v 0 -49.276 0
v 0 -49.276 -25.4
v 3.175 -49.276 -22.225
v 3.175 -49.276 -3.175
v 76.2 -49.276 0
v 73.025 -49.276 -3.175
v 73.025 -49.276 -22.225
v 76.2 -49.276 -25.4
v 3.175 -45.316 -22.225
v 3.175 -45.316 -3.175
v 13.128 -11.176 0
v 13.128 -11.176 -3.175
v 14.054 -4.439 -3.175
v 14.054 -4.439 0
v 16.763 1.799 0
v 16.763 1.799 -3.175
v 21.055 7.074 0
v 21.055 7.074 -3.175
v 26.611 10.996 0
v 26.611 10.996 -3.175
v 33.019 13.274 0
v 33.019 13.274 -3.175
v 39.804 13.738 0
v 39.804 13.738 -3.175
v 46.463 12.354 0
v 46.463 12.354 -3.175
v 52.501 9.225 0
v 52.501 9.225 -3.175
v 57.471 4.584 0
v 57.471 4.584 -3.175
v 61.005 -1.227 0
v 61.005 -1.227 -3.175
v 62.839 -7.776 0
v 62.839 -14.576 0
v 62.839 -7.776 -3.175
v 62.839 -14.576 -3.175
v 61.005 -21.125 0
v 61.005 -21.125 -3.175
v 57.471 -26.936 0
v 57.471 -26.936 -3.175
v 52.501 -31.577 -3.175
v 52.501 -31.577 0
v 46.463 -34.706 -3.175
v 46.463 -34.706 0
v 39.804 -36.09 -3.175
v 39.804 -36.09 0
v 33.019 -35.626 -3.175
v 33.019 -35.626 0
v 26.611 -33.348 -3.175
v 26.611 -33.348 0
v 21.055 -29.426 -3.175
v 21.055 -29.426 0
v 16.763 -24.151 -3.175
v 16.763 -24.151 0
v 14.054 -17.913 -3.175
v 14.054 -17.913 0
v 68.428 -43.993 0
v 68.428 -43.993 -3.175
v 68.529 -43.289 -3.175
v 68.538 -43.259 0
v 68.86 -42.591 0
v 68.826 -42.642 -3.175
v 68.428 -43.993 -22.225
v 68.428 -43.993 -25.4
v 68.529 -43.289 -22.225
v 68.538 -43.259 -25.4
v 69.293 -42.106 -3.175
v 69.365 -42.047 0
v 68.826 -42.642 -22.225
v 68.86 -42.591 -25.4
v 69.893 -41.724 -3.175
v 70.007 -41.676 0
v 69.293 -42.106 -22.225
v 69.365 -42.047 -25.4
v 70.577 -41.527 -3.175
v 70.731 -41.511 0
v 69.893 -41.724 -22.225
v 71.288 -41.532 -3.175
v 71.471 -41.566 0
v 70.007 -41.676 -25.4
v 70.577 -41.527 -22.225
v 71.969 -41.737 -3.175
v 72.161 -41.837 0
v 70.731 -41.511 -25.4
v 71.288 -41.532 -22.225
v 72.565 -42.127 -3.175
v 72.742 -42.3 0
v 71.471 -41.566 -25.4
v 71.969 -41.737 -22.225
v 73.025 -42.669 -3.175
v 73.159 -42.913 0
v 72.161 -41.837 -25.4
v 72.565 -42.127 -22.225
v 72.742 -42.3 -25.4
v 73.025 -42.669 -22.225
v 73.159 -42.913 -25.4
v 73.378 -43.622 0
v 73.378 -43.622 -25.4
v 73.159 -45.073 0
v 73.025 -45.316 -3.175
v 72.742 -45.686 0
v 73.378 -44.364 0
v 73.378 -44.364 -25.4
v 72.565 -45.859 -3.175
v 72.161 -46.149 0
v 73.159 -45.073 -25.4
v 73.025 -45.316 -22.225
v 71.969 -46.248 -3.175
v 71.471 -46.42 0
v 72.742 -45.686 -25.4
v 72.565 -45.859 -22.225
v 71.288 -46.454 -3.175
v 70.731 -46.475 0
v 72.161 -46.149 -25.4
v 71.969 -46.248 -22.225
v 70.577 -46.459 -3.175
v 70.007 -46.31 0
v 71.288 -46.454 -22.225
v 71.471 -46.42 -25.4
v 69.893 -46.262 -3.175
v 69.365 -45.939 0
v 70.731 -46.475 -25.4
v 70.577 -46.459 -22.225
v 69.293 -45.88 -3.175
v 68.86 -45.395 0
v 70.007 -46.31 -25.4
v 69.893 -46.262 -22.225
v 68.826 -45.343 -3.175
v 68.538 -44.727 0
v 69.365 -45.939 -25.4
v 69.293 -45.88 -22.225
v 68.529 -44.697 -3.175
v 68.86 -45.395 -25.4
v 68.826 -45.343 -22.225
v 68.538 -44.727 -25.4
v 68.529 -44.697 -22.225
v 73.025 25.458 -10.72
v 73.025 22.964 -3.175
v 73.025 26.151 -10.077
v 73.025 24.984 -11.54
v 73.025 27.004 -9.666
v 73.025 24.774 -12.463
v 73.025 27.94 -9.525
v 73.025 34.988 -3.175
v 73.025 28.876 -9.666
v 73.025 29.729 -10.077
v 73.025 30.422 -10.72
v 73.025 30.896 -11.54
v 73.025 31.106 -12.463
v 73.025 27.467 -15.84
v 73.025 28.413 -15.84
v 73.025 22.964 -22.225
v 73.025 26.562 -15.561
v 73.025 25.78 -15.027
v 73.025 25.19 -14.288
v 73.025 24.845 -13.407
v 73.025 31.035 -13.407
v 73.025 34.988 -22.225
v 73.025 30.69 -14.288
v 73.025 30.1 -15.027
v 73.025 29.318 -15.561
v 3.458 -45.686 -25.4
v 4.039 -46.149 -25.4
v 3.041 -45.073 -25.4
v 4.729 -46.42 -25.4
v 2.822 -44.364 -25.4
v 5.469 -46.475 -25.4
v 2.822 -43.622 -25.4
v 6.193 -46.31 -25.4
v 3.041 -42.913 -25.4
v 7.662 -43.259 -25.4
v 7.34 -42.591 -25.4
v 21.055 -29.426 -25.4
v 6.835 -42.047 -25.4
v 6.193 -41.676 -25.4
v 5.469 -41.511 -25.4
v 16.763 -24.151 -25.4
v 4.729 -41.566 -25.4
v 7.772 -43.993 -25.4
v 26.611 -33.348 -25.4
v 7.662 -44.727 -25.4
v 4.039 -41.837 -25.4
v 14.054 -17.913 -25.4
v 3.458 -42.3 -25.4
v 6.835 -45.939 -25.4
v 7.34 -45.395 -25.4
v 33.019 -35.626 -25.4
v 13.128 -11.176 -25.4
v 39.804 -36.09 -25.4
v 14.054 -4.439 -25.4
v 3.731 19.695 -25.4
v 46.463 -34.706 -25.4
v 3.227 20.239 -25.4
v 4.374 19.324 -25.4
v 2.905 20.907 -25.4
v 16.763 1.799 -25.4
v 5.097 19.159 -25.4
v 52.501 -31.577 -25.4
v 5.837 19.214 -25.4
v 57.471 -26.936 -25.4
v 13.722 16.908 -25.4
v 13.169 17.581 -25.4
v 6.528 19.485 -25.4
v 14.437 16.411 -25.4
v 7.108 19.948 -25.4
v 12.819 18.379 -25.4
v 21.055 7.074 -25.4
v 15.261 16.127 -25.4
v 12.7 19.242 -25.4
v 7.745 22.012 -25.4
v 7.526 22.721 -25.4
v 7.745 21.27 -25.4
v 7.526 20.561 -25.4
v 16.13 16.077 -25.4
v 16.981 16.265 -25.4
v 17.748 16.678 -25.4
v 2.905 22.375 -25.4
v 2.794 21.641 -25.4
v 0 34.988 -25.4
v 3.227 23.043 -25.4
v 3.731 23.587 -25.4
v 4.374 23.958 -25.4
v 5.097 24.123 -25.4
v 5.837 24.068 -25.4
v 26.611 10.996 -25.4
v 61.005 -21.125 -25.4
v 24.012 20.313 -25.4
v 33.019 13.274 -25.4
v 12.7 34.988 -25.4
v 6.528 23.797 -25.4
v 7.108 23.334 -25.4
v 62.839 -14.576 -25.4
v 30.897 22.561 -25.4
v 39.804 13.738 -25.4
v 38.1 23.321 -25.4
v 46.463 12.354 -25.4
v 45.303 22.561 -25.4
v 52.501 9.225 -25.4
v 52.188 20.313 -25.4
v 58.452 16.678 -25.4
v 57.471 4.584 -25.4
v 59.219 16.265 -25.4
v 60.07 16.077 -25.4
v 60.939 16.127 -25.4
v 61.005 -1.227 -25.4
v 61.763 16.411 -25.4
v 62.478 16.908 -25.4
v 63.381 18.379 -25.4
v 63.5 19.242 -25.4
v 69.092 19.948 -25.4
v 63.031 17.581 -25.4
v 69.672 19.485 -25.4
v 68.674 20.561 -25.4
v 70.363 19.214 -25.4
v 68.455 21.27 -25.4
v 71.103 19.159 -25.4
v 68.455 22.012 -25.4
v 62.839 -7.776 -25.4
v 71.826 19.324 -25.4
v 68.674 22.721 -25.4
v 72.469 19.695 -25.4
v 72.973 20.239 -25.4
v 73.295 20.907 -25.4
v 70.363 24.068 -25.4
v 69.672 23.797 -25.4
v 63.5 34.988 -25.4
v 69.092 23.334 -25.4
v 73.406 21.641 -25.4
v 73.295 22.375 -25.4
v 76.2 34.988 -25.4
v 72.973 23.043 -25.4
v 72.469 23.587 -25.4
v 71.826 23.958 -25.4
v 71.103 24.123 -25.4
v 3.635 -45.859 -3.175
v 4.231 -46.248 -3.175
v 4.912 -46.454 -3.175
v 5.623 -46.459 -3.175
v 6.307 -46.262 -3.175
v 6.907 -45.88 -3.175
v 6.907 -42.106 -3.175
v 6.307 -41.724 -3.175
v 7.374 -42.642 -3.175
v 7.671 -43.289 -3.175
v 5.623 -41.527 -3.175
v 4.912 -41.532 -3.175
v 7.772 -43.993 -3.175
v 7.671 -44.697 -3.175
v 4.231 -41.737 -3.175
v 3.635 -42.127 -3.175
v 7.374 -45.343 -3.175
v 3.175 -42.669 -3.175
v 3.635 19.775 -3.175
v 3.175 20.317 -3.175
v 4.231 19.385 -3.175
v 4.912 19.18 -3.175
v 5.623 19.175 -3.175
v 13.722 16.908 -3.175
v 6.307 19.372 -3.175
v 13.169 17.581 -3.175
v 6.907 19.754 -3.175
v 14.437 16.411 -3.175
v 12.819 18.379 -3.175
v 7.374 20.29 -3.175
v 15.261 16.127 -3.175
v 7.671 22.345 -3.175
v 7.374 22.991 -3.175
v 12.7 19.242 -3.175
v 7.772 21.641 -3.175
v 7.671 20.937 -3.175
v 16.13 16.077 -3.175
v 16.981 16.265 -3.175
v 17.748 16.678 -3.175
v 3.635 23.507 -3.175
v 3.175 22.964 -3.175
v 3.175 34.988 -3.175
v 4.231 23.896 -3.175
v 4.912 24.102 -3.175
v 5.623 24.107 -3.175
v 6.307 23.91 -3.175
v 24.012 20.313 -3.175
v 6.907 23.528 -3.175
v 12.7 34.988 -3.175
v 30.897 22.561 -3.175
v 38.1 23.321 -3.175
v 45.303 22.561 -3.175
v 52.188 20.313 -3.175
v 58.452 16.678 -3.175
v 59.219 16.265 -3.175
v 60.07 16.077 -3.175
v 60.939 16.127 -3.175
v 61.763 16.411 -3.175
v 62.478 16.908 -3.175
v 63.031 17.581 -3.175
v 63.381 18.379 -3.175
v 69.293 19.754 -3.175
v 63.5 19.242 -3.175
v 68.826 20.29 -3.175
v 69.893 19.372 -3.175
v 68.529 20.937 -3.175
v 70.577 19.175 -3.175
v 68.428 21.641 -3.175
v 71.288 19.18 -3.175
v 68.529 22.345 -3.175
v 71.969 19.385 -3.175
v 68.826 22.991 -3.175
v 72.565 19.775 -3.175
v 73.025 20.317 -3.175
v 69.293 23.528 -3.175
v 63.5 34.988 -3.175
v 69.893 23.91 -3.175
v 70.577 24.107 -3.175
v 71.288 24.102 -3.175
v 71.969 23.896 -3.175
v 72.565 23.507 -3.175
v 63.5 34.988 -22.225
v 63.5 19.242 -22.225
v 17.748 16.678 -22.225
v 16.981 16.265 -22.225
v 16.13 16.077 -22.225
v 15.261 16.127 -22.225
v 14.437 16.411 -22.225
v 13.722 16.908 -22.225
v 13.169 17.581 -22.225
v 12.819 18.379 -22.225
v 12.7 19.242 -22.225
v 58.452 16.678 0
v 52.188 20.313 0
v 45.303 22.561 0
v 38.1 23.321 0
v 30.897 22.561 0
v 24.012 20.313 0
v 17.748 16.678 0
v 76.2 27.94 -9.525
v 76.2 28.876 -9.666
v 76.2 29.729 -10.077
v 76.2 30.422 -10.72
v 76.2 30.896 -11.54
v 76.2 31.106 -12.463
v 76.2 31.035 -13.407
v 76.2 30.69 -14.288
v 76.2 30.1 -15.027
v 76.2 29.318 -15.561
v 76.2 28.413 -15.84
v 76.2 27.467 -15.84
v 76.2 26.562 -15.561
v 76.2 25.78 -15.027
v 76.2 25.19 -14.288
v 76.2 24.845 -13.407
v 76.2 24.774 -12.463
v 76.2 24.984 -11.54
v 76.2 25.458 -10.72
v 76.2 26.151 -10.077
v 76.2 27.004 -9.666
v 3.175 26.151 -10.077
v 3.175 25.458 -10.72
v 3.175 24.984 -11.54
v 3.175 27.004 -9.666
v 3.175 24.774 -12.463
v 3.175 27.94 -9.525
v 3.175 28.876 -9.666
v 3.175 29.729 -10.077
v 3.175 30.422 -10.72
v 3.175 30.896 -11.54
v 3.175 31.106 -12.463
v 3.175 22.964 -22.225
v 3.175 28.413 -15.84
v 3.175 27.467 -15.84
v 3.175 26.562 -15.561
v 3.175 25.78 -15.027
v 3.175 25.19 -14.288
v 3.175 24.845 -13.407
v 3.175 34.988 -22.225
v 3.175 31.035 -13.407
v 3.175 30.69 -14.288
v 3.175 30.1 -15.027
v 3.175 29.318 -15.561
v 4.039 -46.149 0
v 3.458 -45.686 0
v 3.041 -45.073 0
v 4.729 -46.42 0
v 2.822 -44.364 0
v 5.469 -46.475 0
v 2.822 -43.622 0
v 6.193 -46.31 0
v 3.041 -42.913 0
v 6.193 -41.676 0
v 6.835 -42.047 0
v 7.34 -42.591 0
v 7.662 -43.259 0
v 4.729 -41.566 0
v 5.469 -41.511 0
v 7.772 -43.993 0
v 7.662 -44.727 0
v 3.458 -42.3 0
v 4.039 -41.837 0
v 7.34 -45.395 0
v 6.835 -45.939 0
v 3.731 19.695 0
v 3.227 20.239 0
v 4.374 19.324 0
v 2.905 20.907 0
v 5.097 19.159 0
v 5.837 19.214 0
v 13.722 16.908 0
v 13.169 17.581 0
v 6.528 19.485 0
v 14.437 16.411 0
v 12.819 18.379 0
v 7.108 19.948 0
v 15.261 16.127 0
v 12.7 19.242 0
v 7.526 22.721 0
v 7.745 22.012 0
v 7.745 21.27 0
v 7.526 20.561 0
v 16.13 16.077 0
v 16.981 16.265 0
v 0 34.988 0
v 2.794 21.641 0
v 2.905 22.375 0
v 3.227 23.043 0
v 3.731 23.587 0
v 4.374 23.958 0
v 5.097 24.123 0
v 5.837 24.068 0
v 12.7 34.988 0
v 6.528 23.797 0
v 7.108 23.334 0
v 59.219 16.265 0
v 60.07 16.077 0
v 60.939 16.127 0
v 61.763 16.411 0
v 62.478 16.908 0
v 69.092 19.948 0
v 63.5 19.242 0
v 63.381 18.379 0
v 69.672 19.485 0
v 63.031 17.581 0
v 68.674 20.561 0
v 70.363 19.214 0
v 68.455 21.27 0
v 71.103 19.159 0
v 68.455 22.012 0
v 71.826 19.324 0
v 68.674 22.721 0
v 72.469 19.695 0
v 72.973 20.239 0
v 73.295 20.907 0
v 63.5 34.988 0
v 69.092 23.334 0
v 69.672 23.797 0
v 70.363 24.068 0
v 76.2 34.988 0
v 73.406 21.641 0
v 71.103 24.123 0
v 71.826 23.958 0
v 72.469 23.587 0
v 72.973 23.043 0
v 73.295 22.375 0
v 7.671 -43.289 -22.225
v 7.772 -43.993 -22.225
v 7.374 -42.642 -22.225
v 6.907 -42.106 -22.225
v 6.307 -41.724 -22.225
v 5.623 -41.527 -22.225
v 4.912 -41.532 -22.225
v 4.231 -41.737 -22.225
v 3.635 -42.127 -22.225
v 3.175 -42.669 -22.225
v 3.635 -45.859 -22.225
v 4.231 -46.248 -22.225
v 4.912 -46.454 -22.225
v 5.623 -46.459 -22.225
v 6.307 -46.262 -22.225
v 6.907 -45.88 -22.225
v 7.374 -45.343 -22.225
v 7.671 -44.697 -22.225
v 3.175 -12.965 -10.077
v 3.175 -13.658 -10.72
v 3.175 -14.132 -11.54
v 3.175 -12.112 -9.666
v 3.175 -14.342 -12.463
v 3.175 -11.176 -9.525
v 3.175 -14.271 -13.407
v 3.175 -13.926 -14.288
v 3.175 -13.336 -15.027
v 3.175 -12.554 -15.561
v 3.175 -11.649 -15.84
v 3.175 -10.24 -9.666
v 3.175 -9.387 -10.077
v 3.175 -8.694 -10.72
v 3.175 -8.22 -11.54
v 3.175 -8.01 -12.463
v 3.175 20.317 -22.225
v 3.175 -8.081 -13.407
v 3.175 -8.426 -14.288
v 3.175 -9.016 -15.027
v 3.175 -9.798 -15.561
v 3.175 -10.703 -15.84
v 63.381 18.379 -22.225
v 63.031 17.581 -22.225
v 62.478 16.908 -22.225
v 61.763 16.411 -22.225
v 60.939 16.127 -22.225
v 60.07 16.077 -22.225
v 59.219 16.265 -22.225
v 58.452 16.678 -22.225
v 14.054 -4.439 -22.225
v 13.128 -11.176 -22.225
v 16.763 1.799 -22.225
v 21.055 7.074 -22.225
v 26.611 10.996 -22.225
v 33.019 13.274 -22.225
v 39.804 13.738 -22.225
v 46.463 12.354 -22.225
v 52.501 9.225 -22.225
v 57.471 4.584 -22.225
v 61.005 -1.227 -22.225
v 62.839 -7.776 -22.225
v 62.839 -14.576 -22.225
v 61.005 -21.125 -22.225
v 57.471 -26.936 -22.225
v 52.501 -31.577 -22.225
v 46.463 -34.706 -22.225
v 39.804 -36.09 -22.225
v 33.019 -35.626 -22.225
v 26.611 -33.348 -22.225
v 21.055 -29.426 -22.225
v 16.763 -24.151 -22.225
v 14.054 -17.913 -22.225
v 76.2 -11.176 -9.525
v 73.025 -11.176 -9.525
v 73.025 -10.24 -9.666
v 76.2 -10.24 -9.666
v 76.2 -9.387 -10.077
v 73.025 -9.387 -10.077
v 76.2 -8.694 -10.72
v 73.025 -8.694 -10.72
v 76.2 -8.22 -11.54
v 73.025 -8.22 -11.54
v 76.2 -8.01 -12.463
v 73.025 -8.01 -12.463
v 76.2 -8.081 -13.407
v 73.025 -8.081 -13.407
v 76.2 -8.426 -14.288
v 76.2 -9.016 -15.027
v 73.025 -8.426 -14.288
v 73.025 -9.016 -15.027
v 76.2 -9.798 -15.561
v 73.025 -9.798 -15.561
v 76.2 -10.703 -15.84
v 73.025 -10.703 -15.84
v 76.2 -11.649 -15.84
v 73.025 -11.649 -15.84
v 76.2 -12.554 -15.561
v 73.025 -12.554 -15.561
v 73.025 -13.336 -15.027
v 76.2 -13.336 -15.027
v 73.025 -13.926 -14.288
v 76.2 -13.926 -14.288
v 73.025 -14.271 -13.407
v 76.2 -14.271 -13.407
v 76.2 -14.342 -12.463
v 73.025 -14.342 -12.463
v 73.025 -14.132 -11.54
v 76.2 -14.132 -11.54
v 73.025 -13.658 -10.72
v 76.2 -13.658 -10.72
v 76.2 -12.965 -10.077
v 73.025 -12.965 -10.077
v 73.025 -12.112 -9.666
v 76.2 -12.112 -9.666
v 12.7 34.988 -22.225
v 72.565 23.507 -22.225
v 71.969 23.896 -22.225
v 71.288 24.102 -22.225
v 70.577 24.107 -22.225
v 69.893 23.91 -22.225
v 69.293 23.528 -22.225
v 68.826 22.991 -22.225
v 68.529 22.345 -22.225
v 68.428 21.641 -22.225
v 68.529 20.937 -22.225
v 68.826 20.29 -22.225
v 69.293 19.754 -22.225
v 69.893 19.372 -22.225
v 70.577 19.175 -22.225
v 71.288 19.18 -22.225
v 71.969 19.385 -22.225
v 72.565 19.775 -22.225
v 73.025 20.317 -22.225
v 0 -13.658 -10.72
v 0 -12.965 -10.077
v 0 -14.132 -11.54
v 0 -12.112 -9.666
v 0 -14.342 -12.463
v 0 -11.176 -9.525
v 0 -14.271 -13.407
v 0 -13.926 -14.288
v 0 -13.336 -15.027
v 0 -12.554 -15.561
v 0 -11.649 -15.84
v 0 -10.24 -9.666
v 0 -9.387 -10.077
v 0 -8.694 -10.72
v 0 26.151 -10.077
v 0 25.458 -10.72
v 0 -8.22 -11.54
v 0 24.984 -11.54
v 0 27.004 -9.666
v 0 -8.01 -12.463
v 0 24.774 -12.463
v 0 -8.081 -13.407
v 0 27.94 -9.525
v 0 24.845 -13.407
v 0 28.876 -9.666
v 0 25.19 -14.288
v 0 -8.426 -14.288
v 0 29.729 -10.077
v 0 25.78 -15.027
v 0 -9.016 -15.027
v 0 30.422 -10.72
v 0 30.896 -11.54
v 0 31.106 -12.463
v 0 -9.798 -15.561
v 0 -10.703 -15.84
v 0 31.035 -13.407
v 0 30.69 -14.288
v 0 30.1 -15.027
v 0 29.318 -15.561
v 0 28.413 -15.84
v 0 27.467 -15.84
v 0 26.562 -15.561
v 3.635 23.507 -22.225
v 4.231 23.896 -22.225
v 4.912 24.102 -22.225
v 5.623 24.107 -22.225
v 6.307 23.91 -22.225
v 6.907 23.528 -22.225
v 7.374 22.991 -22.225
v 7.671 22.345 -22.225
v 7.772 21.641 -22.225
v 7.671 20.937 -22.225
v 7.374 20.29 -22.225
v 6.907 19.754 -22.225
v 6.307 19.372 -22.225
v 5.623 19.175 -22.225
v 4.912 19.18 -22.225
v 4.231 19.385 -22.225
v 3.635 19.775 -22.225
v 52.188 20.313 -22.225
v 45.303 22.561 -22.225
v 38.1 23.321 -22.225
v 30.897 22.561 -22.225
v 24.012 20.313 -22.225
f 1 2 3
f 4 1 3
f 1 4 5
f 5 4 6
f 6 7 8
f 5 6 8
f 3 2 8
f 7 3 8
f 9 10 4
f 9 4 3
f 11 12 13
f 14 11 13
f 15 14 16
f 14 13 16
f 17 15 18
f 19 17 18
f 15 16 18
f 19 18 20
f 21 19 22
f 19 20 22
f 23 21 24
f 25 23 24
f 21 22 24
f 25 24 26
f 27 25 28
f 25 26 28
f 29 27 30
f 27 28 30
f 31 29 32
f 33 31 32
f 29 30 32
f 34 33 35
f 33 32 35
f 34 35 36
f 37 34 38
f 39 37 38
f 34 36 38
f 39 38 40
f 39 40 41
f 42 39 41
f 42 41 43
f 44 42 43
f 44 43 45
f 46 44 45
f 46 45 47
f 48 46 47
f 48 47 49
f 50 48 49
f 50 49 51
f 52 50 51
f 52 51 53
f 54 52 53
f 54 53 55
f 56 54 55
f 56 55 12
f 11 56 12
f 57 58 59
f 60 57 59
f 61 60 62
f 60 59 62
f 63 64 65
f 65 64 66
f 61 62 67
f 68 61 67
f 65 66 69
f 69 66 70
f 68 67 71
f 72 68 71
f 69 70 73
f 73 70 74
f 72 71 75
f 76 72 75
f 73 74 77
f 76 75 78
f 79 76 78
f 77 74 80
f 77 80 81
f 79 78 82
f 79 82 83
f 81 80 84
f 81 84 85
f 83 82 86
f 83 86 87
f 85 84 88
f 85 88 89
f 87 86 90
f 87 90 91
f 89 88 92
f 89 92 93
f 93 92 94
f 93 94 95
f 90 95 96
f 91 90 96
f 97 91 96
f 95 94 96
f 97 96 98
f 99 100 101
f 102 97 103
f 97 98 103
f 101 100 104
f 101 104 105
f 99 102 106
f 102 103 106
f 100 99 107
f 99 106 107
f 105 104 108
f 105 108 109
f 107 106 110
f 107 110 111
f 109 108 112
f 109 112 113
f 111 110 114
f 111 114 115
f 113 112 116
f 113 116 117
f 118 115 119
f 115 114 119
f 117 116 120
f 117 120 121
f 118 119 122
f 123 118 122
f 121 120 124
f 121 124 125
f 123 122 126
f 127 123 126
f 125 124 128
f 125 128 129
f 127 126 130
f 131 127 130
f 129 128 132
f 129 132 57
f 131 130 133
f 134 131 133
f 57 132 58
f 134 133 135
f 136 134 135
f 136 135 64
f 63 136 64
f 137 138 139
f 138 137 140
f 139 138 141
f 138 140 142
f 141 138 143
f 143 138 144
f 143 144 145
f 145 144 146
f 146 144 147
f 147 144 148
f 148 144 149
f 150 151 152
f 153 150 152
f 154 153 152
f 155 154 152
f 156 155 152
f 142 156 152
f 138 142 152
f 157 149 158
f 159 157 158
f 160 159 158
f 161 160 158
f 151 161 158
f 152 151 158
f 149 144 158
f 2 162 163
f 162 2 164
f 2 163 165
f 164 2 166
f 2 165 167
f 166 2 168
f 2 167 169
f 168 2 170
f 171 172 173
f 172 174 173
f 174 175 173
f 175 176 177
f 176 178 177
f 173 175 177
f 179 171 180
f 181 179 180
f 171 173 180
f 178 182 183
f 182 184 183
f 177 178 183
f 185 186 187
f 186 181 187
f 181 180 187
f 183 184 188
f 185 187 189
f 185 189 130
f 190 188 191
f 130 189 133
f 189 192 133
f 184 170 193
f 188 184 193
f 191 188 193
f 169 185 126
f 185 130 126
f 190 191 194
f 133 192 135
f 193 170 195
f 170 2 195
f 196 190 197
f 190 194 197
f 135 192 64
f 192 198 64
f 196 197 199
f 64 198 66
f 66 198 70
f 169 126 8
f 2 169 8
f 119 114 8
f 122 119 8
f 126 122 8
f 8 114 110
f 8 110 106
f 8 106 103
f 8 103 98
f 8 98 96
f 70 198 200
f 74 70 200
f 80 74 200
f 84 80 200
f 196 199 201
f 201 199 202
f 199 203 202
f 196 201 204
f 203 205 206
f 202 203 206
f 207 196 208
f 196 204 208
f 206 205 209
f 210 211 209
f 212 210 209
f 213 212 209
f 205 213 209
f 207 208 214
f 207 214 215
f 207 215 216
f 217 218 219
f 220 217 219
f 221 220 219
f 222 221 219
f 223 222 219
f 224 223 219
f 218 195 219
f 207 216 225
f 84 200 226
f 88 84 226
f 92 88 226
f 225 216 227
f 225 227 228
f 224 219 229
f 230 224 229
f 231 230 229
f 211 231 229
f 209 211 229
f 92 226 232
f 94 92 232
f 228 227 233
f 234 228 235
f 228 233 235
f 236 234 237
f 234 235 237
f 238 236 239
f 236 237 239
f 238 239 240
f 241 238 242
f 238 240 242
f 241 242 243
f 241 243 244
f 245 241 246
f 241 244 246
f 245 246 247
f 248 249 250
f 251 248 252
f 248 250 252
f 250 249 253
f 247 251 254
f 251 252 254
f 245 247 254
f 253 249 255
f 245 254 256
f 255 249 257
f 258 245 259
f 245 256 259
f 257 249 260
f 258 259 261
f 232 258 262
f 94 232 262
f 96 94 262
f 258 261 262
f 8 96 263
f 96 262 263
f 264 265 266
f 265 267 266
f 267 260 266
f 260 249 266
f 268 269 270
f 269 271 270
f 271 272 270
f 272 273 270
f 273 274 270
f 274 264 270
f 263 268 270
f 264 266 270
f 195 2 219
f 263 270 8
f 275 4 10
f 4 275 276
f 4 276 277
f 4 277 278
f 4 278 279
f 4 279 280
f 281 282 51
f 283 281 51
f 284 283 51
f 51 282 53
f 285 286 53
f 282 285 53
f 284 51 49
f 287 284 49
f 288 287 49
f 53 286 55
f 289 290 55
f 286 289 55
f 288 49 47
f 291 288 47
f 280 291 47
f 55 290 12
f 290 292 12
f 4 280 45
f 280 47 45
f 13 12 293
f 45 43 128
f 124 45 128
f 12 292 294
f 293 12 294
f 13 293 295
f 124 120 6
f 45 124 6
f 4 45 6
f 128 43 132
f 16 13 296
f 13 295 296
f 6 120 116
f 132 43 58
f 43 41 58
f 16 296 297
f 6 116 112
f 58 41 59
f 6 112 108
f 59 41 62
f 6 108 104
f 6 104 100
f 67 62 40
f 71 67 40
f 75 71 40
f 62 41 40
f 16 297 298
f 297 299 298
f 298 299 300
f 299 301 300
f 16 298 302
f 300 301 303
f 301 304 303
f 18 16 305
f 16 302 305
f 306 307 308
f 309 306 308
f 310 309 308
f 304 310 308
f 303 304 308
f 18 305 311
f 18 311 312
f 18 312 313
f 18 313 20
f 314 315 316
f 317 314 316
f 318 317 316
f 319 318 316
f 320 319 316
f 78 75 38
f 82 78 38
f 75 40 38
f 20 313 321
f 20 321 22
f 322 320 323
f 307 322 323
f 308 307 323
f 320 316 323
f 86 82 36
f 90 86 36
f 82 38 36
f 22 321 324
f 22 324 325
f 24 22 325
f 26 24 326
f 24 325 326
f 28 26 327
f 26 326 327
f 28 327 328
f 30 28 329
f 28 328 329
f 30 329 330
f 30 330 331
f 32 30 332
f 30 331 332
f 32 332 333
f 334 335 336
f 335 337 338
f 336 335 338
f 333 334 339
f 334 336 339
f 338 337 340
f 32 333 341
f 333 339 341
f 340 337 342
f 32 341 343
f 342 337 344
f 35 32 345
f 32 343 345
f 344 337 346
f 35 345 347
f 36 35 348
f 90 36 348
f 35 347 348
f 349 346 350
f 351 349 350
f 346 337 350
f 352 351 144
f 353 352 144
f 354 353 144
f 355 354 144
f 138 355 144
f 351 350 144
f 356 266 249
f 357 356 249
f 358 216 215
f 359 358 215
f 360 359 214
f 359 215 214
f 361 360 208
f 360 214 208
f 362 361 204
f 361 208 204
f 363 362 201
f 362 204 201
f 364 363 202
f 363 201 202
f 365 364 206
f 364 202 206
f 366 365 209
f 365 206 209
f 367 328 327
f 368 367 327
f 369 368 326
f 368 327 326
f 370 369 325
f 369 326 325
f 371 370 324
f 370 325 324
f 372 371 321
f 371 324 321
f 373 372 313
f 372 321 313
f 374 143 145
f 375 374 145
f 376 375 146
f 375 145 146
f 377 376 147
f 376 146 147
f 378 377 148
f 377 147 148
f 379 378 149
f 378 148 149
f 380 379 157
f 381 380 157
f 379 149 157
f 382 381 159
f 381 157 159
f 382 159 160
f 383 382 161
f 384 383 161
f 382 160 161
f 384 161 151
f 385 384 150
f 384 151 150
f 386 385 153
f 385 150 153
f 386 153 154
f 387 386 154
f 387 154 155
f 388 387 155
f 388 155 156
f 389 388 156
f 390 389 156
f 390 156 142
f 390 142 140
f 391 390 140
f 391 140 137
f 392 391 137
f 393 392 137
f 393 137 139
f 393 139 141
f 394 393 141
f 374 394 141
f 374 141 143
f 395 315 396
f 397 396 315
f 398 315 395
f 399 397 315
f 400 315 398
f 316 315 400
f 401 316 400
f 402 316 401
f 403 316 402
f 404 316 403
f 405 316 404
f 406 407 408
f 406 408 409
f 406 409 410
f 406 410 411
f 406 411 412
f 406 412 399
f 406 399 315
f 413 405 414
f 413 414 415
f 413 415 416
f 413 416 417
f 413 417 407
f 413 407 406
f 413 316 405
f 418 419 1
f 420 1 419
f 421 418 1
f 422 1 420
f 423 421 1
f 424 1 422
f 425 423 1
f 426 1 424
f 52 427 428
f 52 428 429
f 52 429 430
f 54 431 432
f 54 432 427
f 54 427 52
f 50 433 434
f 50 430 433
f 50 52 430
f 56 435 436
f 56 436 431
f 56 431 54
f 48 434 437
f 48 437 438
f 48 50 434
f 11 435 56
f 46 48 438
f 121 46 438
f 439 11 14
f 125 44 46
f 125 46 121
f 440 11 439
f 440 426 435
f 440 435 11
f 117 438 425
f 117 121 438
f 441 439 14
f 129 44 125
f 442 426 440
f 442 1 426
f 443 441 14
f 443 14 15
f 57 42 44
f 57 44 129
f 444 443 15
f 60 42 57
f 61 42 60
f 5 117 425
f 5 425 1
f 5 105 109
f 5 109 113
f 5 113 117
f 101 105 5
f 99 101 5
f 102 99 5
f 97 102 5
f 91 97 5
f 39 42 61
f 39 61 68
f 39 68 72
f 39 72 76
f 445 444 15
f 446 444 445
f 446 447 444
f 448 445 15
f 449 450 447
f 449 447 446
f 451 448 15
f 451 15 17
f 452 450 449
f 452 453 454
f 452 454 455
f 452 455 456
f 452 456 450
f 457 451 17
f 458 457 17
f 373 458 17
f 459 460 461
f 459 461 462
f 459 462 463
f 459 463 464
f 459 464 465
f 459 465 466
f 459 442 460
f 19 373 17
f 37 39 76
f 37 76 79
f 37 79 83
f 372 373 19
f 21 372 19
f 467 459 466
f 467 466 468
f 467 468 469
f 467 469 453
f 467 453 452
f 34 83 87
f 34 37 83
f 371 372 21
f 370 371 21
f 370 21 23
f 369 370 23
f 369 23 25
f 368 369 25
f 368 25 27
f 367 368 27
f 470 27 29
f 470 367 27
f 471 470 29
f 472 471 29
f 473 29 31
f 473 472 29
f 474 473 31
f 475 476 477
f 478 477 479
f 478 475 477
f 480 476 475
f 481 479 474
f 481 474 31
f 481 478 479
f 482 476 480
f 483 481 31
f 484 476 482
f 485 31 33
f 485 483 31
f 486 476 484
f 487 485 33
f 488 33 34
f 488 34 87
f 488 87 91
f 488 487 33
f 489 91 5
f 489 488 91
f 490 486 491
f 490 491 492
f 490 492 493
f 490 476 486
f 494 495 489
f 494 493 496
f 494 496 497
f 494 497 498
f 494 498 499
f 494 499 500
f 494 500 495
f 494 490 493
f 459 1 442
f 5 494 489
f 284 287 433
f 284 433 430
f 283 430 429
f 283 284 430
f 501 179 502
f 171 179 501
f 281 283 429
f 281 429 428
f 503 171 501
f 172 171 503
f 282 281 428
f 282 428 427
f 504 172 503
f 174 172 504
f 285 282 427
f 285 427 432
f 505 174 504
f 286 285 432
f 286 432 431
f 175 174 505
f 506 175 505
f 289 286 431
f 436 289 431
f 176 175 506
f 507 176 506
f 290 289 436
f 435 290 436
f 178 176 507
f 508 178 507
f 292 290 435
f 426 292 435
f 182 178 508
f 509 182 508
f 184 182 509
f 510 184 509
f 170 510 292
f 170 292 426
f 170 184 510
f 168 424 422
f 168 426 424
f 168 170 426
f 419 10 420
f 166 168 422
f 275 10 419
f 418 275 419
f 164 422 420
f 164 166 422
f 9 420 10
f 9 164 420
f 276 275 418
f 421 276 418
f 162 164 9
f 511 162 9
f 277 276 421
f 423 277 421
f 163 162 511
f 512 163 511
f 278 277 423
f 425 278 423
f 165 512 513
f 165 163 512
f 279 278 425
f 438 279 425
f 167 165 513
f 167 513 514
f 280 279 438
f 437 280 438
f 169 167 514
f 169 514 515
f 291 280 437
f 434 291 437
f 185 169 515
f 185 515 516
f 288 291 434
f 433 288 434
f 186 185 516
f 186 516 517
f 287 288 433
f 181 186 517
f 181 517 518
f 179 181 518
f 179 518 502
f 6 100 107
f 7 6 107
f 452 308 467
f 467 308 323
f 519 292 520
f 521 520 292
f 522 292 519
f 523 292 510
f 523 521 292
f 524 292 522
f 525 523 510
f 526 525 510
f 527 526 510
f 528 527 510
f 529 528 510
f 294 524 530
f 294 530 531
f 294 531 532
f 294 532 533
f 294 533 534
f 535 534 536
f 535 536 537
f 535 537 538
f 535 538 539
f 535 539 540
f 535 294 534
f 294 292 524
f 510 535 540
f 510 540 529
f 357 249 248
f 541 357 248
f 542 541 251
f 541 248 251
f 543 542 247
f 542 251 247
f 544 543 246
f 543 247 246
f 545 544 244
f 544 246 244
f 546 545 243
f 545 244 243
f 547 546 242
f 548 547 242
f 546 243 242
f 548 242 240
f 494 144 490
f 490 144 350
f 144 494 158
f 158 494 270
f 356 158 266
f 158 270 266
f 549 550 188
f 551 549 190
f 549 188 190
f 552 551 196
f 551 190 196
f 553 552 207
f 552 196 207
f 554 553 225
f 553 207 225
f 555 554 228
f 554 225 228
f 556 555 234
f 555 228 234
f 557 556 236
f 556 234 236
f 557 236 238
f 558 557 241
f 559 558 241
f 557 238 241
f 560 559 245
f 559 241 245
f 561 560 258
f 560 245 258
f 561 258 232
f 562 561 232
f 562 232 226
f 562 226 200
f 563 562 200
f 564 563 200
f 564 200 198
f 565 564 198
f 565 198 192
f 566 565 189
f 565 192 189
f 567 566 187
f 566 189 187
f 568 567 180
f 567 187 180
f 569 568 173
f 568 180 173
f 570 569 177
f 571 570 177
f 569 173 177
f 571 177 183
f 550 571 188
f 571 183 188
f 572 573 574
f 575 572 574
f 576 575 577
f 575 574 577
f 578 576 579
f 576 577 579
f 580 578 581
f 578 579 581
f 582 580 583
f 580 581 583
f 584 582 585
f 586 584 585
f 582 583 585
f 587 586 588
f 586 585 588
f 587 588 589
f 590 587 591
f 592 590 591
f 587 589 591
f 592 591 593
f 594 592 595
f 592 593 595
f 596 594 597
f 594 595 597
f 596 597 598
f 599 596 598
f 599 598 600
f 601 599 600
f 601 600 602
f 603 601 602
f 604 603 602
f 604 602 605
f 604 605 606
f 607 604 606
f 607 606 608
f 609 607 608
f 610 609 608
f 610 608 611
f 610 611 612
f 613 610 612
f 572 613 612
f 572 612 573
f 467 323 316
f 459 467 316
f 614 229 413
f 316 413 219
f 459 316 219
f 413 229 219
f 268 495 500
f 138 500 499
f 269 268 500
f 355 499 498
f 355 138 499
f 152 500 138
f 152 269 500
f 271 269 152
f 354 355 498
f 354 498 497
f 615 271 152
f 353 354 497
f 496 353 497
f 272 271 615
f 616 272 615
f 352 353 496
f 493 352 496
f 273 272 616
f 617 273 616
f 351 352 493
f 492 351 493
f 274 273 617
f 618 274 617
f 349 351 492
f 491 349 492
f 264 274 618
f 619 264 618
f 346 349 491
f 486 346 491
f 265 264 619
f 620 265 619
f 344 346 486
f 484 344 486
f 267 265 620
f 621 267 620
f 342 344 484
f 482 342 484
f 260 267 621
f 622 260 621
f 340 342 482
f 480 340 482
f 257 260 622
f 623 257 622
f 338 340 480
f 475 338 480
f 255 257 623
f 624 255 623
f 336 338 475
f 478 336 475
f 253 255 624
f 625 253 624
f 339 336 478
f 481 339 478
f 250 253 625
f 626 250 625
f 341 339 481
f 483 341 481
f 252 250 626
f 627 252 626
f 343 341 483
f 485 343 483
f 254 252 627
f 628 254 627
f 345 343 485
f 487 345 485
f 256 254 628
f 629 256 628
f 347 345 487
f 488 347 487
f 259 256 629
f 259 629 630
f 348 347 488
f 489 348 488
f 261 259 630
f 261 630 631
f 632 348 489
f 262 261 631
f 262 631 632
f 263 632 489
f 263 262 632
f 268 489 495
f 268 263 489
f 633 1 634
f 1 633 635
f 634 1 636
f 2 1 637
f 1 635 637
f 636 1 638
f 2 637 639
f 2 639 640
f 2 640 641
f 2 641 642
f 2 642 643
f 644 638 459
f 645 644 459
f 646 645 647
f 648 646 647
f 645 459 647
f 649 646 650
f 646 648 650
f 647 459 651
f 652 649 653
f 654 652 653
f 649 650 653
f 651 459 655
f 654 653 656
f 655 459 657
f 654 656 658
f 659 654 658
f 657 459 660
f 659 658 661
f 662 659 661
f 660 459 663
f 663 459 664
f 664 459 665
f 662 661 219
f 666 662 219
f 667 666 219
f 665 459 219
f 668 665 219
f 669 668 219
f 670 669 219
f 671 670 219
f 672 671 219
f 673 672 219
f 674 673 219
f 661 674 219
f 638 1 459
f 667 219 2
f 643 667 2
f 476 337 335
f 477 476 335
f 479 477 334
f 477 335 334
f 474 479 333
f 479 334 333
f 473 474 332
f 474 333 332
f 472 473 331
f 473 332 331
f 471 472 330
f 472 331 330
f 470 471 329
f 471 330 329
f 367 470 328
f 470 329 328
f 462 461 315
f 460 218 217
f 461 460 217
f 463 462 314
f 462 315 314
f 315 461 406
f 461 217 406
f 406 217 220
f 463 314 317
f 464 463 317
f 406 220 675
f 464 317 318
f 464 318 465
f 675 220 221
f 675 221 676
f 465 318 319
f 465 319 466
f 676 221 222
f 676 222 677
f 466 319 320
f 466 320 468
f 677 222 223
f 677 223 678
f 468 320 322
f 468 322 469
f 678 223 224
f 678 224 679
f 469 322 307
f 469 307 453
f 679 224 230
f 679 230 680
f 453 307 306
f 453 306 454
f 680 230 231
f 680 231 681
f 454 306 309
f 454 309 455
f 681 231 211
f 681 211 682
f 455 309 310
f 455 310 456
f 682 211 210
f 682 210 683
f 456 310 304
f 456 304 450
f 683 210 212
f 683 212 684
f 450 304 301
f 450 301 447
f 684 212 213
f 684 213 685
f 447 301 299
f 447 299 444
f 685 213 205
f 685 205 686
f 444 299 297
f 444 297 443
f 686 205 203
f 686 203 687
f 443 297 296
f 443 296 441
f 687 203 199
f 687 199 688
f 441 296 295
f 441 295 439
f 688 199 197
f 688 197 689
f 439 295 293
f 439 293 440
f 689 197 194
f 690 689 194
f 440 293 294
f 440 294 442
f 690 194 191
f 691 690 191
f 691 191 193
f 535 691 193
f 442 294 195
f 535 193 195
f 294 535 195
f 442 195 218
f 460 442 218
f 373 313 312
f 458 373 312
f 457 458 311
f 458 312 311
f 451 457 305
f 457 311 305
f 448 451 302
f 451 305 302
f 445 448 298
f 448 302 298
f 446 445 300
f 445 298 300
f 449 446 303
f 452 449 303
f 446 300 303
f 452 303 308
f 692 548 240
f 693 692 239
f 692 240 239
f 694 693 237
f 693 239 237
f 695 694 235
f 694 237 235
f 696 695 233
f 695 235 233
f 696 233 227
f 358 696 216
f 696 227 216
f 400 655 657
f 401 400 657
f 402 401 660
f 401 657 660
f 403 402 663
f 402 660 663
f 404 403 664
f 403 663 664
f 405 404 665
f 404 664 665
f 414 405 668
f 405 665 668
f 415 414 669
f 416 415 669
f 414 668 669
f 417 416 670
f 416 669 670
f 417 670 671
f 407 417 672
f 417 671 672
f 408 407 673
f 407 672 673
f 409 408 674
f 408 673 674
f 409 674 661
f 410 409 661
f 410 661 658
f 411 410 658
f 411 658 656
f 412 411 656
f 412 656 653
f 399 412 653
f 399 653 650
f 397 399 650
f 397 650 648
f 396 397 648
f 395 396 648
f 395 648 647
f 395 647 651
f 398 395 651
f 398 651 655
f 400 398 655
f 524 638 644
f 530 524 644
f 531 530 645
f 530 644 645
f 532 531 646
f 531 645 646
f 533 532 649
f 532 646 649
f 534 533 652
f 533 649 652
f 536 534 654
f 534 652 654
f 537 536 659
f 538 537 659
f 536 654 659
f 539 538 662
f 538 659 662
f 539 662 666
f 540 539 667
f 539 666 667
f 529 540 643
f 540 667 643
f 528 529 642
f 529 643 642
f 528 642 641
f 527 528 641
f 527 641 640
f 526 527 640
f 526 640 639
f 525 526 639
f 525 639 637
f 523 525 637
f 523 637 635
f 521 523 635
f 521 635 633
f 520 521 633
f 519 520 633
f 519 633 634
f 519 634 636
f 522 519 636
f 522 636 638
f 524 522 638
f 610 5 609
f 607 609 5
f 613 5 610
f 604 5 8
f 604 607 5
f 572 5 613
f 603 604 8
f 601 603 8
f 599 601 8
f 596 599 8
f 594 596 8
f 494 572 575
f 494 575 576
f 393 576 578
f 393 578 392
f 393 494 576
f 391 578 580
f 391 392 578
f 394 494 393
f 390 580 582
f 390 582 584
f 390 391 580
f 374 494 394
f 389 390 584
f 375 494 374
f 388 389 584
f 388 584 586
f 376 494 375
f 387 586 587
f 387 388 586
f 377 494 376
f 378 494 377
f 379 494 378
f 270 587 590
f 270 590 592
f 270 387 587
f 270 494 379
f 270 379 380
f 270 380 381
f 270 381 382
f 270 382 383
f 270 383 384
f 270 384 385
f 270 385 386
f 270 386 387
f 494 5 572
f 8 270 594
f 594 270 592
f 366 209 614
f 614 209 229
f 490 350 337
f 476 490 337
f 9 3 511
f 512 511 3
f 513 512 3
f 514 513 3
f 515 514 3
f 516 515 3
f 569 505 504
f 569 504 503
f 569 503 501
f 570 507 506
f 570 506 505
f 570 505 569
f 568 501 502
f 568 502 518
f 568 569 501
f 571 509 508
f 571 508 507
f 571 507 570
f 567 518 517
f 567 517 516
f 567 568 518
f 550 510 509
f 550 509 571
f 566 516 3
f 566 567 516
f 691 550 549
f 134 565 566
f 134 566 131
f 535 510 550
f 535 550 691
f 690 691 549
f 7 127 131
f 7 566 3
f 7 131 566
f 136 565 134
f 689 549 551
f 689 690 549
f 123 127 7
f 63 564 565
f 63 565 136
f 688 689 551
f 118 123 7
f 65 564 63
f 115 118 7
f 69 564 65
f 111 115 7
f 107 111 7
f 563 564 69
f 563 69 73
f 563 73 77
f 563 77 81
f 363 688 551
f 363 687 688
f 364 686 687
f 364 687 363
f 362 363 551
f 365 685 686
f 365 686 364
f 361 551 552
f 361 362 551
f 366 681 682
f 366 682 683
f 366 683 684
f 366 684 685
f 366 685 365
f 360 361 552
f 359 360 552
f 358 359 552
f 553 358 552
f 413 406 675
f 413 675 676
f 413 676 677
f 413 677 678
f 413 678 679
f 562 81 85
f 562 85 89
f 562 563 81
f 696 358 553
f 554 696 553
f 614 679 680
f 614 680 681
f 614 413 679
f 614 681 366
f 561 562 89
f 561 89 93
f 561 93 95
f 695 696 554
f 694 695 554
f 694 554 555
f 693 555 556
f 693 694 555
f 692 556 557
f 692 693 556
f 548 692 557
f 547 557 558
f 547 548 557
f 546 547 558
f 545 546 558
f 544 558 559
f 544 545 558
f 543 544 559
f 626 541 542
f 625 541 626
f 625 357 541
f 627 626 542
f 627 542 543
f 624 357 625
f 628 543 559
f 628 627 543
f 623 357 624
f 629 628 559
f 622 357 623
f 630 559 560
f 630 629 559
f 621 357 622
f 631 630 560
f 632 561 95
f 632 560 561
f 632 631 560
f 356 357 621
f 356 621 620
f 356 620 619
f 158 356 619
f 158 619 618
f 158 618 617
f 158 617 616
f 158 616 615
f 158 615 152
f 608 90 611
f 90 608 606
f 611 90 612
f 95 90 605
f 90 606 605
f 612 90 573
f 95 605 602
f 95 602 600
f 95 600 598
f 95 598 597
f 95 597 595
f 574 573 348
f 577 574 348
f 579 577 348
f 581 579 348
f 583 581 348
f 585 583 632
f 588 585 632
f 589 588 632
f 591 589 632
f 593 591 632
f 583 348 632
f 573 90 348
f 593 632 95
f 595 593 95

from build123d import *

# Parameters (mm, degrees)
SKETCH1_W           = 76.2
SKETCH1_H           = 25.4
SKETCH1_W_2         = 69.85
SKETCH1_H_2         = 19.05
EXTRUDE_THIN1_DEPTH = 49.276
SKETCH2_R           = 2.4892
SKETCH2_R_2         = 24.97201
CUT_EXTRUDE1_DEPTH  = 52.578
CUT_EXTRUDE2_DEPTH  = 26.4
SKETCH6_R           = 3.175
CUT_EXTRUDE3_DEPTH  = 77.2
SKETCH7_R           = 3.175
CUT_EXTRUDE4_DEPTH  = 77.2


with BuildPart() as part:
    # Sketch1 → Extrude-Thin1 (new body, symmetric)
    with BuildSketch(Plane(origin=(0, 0, 0), x_dir=(1, 0, 0), z_dir=(0, 1, 0))):
        with Locations((38.1, 12.7)):
            Rectangle(SKETCH1_W, SKETCH1_H)
        with Locations((38.1, 12.7)):
            Rectangle(SKETCH1_W_2, SKETCH1_H_2, mode=Mode.SUBTRACT)
    extrude(amount=EXTRUDE_THIN1_DEPTH, both=True)

    # Sketch2 → Cut-Extrude1 (cut)
    with BuildSketch(Plane(origin=(0, 0, -25.4), x_dir=(-1, 0, 0), z_dir=(0, 0, -1))):
        with Locations((-5.2832, 21.6408)):
            Circle(SKETCH2_R)
        with Locations((-38.1, -11.176)):
            Circle(SKETCH2_R_2)
        with Locations((-70.9168, -43.9928)):
            Circle(SKETCH2_R)
    cut_extrude1 = extrude(amount=-CUT_EXTRUDE1_DEPTH, mode=Mode.SUBTRACT)

    # Sketch5 → Cut-Extrude2 (cut, through all)
    with BuildSketch(Plane(origin=(0, 0, -25.4), x_dir=(-1, 0, 0), z_dir=(0, 0, -1))):
        Polygon((0, 49.276), (-76.2, 49.276), (-76.2, 34.9885), (-63.5, 34.9885), (-12.7, 34.9885), (0, 34.9885), align=None)
        with BuildLine():
            Line((-12.7, 34.9885), (-63.5, 34.9885))
            Line((-63.5, 34.9885), (-63.5, 19.241588866))
            ThreePointArc((-63.5, 19.241588866), (-61.762611537, 16.410705953), (-58.451875232, 16.677992057))
            ThreePointArc((-58.451875232, 16.677992057), (-38.1, 23.32101), (-17.748124768, 16.677992057))
            ThreePointArc((-17.748124768, 16.677992057), (-14.437388463, 16.410705953), (-12.7, 19.241588866))
            Line((-12.7, 19.241588866), (-12.7, 34.9885))
        make_face()
    extrude(amount=-CUT_EXTRUDE2_DEPTH, mode=Mode.SUBTRACT)

    # Sketch6 → Cut-Extrude3 (cut, through all)
    with BuildSketch(Plane.ZY):
        with Locations((-12.7, 27.94)):
            Circle(SKETCH6_R)
    extrude(amount=-CUT_EXTRUDE3_DEPTH, mode=Mode.SUBTRACT)

    # Mirror1: Cut-Extrude1 across plane
    add(cut_extrude1.mirror(Plane.ZY.offset(-38.1)), mode=Mode.SUBTRACT)

    # Sketch7 → Cut-Extrude4 (cut, through all)
    with BuildSketch(Plane.ZY):
        with Locations((-12.7, -11.176)):
            Circle(SKETCH7_R)
    extrude(amount=-CUT_EXTRUDE4_DEPTH, mode=Mode.SUBTRACT)


solid = part.part
